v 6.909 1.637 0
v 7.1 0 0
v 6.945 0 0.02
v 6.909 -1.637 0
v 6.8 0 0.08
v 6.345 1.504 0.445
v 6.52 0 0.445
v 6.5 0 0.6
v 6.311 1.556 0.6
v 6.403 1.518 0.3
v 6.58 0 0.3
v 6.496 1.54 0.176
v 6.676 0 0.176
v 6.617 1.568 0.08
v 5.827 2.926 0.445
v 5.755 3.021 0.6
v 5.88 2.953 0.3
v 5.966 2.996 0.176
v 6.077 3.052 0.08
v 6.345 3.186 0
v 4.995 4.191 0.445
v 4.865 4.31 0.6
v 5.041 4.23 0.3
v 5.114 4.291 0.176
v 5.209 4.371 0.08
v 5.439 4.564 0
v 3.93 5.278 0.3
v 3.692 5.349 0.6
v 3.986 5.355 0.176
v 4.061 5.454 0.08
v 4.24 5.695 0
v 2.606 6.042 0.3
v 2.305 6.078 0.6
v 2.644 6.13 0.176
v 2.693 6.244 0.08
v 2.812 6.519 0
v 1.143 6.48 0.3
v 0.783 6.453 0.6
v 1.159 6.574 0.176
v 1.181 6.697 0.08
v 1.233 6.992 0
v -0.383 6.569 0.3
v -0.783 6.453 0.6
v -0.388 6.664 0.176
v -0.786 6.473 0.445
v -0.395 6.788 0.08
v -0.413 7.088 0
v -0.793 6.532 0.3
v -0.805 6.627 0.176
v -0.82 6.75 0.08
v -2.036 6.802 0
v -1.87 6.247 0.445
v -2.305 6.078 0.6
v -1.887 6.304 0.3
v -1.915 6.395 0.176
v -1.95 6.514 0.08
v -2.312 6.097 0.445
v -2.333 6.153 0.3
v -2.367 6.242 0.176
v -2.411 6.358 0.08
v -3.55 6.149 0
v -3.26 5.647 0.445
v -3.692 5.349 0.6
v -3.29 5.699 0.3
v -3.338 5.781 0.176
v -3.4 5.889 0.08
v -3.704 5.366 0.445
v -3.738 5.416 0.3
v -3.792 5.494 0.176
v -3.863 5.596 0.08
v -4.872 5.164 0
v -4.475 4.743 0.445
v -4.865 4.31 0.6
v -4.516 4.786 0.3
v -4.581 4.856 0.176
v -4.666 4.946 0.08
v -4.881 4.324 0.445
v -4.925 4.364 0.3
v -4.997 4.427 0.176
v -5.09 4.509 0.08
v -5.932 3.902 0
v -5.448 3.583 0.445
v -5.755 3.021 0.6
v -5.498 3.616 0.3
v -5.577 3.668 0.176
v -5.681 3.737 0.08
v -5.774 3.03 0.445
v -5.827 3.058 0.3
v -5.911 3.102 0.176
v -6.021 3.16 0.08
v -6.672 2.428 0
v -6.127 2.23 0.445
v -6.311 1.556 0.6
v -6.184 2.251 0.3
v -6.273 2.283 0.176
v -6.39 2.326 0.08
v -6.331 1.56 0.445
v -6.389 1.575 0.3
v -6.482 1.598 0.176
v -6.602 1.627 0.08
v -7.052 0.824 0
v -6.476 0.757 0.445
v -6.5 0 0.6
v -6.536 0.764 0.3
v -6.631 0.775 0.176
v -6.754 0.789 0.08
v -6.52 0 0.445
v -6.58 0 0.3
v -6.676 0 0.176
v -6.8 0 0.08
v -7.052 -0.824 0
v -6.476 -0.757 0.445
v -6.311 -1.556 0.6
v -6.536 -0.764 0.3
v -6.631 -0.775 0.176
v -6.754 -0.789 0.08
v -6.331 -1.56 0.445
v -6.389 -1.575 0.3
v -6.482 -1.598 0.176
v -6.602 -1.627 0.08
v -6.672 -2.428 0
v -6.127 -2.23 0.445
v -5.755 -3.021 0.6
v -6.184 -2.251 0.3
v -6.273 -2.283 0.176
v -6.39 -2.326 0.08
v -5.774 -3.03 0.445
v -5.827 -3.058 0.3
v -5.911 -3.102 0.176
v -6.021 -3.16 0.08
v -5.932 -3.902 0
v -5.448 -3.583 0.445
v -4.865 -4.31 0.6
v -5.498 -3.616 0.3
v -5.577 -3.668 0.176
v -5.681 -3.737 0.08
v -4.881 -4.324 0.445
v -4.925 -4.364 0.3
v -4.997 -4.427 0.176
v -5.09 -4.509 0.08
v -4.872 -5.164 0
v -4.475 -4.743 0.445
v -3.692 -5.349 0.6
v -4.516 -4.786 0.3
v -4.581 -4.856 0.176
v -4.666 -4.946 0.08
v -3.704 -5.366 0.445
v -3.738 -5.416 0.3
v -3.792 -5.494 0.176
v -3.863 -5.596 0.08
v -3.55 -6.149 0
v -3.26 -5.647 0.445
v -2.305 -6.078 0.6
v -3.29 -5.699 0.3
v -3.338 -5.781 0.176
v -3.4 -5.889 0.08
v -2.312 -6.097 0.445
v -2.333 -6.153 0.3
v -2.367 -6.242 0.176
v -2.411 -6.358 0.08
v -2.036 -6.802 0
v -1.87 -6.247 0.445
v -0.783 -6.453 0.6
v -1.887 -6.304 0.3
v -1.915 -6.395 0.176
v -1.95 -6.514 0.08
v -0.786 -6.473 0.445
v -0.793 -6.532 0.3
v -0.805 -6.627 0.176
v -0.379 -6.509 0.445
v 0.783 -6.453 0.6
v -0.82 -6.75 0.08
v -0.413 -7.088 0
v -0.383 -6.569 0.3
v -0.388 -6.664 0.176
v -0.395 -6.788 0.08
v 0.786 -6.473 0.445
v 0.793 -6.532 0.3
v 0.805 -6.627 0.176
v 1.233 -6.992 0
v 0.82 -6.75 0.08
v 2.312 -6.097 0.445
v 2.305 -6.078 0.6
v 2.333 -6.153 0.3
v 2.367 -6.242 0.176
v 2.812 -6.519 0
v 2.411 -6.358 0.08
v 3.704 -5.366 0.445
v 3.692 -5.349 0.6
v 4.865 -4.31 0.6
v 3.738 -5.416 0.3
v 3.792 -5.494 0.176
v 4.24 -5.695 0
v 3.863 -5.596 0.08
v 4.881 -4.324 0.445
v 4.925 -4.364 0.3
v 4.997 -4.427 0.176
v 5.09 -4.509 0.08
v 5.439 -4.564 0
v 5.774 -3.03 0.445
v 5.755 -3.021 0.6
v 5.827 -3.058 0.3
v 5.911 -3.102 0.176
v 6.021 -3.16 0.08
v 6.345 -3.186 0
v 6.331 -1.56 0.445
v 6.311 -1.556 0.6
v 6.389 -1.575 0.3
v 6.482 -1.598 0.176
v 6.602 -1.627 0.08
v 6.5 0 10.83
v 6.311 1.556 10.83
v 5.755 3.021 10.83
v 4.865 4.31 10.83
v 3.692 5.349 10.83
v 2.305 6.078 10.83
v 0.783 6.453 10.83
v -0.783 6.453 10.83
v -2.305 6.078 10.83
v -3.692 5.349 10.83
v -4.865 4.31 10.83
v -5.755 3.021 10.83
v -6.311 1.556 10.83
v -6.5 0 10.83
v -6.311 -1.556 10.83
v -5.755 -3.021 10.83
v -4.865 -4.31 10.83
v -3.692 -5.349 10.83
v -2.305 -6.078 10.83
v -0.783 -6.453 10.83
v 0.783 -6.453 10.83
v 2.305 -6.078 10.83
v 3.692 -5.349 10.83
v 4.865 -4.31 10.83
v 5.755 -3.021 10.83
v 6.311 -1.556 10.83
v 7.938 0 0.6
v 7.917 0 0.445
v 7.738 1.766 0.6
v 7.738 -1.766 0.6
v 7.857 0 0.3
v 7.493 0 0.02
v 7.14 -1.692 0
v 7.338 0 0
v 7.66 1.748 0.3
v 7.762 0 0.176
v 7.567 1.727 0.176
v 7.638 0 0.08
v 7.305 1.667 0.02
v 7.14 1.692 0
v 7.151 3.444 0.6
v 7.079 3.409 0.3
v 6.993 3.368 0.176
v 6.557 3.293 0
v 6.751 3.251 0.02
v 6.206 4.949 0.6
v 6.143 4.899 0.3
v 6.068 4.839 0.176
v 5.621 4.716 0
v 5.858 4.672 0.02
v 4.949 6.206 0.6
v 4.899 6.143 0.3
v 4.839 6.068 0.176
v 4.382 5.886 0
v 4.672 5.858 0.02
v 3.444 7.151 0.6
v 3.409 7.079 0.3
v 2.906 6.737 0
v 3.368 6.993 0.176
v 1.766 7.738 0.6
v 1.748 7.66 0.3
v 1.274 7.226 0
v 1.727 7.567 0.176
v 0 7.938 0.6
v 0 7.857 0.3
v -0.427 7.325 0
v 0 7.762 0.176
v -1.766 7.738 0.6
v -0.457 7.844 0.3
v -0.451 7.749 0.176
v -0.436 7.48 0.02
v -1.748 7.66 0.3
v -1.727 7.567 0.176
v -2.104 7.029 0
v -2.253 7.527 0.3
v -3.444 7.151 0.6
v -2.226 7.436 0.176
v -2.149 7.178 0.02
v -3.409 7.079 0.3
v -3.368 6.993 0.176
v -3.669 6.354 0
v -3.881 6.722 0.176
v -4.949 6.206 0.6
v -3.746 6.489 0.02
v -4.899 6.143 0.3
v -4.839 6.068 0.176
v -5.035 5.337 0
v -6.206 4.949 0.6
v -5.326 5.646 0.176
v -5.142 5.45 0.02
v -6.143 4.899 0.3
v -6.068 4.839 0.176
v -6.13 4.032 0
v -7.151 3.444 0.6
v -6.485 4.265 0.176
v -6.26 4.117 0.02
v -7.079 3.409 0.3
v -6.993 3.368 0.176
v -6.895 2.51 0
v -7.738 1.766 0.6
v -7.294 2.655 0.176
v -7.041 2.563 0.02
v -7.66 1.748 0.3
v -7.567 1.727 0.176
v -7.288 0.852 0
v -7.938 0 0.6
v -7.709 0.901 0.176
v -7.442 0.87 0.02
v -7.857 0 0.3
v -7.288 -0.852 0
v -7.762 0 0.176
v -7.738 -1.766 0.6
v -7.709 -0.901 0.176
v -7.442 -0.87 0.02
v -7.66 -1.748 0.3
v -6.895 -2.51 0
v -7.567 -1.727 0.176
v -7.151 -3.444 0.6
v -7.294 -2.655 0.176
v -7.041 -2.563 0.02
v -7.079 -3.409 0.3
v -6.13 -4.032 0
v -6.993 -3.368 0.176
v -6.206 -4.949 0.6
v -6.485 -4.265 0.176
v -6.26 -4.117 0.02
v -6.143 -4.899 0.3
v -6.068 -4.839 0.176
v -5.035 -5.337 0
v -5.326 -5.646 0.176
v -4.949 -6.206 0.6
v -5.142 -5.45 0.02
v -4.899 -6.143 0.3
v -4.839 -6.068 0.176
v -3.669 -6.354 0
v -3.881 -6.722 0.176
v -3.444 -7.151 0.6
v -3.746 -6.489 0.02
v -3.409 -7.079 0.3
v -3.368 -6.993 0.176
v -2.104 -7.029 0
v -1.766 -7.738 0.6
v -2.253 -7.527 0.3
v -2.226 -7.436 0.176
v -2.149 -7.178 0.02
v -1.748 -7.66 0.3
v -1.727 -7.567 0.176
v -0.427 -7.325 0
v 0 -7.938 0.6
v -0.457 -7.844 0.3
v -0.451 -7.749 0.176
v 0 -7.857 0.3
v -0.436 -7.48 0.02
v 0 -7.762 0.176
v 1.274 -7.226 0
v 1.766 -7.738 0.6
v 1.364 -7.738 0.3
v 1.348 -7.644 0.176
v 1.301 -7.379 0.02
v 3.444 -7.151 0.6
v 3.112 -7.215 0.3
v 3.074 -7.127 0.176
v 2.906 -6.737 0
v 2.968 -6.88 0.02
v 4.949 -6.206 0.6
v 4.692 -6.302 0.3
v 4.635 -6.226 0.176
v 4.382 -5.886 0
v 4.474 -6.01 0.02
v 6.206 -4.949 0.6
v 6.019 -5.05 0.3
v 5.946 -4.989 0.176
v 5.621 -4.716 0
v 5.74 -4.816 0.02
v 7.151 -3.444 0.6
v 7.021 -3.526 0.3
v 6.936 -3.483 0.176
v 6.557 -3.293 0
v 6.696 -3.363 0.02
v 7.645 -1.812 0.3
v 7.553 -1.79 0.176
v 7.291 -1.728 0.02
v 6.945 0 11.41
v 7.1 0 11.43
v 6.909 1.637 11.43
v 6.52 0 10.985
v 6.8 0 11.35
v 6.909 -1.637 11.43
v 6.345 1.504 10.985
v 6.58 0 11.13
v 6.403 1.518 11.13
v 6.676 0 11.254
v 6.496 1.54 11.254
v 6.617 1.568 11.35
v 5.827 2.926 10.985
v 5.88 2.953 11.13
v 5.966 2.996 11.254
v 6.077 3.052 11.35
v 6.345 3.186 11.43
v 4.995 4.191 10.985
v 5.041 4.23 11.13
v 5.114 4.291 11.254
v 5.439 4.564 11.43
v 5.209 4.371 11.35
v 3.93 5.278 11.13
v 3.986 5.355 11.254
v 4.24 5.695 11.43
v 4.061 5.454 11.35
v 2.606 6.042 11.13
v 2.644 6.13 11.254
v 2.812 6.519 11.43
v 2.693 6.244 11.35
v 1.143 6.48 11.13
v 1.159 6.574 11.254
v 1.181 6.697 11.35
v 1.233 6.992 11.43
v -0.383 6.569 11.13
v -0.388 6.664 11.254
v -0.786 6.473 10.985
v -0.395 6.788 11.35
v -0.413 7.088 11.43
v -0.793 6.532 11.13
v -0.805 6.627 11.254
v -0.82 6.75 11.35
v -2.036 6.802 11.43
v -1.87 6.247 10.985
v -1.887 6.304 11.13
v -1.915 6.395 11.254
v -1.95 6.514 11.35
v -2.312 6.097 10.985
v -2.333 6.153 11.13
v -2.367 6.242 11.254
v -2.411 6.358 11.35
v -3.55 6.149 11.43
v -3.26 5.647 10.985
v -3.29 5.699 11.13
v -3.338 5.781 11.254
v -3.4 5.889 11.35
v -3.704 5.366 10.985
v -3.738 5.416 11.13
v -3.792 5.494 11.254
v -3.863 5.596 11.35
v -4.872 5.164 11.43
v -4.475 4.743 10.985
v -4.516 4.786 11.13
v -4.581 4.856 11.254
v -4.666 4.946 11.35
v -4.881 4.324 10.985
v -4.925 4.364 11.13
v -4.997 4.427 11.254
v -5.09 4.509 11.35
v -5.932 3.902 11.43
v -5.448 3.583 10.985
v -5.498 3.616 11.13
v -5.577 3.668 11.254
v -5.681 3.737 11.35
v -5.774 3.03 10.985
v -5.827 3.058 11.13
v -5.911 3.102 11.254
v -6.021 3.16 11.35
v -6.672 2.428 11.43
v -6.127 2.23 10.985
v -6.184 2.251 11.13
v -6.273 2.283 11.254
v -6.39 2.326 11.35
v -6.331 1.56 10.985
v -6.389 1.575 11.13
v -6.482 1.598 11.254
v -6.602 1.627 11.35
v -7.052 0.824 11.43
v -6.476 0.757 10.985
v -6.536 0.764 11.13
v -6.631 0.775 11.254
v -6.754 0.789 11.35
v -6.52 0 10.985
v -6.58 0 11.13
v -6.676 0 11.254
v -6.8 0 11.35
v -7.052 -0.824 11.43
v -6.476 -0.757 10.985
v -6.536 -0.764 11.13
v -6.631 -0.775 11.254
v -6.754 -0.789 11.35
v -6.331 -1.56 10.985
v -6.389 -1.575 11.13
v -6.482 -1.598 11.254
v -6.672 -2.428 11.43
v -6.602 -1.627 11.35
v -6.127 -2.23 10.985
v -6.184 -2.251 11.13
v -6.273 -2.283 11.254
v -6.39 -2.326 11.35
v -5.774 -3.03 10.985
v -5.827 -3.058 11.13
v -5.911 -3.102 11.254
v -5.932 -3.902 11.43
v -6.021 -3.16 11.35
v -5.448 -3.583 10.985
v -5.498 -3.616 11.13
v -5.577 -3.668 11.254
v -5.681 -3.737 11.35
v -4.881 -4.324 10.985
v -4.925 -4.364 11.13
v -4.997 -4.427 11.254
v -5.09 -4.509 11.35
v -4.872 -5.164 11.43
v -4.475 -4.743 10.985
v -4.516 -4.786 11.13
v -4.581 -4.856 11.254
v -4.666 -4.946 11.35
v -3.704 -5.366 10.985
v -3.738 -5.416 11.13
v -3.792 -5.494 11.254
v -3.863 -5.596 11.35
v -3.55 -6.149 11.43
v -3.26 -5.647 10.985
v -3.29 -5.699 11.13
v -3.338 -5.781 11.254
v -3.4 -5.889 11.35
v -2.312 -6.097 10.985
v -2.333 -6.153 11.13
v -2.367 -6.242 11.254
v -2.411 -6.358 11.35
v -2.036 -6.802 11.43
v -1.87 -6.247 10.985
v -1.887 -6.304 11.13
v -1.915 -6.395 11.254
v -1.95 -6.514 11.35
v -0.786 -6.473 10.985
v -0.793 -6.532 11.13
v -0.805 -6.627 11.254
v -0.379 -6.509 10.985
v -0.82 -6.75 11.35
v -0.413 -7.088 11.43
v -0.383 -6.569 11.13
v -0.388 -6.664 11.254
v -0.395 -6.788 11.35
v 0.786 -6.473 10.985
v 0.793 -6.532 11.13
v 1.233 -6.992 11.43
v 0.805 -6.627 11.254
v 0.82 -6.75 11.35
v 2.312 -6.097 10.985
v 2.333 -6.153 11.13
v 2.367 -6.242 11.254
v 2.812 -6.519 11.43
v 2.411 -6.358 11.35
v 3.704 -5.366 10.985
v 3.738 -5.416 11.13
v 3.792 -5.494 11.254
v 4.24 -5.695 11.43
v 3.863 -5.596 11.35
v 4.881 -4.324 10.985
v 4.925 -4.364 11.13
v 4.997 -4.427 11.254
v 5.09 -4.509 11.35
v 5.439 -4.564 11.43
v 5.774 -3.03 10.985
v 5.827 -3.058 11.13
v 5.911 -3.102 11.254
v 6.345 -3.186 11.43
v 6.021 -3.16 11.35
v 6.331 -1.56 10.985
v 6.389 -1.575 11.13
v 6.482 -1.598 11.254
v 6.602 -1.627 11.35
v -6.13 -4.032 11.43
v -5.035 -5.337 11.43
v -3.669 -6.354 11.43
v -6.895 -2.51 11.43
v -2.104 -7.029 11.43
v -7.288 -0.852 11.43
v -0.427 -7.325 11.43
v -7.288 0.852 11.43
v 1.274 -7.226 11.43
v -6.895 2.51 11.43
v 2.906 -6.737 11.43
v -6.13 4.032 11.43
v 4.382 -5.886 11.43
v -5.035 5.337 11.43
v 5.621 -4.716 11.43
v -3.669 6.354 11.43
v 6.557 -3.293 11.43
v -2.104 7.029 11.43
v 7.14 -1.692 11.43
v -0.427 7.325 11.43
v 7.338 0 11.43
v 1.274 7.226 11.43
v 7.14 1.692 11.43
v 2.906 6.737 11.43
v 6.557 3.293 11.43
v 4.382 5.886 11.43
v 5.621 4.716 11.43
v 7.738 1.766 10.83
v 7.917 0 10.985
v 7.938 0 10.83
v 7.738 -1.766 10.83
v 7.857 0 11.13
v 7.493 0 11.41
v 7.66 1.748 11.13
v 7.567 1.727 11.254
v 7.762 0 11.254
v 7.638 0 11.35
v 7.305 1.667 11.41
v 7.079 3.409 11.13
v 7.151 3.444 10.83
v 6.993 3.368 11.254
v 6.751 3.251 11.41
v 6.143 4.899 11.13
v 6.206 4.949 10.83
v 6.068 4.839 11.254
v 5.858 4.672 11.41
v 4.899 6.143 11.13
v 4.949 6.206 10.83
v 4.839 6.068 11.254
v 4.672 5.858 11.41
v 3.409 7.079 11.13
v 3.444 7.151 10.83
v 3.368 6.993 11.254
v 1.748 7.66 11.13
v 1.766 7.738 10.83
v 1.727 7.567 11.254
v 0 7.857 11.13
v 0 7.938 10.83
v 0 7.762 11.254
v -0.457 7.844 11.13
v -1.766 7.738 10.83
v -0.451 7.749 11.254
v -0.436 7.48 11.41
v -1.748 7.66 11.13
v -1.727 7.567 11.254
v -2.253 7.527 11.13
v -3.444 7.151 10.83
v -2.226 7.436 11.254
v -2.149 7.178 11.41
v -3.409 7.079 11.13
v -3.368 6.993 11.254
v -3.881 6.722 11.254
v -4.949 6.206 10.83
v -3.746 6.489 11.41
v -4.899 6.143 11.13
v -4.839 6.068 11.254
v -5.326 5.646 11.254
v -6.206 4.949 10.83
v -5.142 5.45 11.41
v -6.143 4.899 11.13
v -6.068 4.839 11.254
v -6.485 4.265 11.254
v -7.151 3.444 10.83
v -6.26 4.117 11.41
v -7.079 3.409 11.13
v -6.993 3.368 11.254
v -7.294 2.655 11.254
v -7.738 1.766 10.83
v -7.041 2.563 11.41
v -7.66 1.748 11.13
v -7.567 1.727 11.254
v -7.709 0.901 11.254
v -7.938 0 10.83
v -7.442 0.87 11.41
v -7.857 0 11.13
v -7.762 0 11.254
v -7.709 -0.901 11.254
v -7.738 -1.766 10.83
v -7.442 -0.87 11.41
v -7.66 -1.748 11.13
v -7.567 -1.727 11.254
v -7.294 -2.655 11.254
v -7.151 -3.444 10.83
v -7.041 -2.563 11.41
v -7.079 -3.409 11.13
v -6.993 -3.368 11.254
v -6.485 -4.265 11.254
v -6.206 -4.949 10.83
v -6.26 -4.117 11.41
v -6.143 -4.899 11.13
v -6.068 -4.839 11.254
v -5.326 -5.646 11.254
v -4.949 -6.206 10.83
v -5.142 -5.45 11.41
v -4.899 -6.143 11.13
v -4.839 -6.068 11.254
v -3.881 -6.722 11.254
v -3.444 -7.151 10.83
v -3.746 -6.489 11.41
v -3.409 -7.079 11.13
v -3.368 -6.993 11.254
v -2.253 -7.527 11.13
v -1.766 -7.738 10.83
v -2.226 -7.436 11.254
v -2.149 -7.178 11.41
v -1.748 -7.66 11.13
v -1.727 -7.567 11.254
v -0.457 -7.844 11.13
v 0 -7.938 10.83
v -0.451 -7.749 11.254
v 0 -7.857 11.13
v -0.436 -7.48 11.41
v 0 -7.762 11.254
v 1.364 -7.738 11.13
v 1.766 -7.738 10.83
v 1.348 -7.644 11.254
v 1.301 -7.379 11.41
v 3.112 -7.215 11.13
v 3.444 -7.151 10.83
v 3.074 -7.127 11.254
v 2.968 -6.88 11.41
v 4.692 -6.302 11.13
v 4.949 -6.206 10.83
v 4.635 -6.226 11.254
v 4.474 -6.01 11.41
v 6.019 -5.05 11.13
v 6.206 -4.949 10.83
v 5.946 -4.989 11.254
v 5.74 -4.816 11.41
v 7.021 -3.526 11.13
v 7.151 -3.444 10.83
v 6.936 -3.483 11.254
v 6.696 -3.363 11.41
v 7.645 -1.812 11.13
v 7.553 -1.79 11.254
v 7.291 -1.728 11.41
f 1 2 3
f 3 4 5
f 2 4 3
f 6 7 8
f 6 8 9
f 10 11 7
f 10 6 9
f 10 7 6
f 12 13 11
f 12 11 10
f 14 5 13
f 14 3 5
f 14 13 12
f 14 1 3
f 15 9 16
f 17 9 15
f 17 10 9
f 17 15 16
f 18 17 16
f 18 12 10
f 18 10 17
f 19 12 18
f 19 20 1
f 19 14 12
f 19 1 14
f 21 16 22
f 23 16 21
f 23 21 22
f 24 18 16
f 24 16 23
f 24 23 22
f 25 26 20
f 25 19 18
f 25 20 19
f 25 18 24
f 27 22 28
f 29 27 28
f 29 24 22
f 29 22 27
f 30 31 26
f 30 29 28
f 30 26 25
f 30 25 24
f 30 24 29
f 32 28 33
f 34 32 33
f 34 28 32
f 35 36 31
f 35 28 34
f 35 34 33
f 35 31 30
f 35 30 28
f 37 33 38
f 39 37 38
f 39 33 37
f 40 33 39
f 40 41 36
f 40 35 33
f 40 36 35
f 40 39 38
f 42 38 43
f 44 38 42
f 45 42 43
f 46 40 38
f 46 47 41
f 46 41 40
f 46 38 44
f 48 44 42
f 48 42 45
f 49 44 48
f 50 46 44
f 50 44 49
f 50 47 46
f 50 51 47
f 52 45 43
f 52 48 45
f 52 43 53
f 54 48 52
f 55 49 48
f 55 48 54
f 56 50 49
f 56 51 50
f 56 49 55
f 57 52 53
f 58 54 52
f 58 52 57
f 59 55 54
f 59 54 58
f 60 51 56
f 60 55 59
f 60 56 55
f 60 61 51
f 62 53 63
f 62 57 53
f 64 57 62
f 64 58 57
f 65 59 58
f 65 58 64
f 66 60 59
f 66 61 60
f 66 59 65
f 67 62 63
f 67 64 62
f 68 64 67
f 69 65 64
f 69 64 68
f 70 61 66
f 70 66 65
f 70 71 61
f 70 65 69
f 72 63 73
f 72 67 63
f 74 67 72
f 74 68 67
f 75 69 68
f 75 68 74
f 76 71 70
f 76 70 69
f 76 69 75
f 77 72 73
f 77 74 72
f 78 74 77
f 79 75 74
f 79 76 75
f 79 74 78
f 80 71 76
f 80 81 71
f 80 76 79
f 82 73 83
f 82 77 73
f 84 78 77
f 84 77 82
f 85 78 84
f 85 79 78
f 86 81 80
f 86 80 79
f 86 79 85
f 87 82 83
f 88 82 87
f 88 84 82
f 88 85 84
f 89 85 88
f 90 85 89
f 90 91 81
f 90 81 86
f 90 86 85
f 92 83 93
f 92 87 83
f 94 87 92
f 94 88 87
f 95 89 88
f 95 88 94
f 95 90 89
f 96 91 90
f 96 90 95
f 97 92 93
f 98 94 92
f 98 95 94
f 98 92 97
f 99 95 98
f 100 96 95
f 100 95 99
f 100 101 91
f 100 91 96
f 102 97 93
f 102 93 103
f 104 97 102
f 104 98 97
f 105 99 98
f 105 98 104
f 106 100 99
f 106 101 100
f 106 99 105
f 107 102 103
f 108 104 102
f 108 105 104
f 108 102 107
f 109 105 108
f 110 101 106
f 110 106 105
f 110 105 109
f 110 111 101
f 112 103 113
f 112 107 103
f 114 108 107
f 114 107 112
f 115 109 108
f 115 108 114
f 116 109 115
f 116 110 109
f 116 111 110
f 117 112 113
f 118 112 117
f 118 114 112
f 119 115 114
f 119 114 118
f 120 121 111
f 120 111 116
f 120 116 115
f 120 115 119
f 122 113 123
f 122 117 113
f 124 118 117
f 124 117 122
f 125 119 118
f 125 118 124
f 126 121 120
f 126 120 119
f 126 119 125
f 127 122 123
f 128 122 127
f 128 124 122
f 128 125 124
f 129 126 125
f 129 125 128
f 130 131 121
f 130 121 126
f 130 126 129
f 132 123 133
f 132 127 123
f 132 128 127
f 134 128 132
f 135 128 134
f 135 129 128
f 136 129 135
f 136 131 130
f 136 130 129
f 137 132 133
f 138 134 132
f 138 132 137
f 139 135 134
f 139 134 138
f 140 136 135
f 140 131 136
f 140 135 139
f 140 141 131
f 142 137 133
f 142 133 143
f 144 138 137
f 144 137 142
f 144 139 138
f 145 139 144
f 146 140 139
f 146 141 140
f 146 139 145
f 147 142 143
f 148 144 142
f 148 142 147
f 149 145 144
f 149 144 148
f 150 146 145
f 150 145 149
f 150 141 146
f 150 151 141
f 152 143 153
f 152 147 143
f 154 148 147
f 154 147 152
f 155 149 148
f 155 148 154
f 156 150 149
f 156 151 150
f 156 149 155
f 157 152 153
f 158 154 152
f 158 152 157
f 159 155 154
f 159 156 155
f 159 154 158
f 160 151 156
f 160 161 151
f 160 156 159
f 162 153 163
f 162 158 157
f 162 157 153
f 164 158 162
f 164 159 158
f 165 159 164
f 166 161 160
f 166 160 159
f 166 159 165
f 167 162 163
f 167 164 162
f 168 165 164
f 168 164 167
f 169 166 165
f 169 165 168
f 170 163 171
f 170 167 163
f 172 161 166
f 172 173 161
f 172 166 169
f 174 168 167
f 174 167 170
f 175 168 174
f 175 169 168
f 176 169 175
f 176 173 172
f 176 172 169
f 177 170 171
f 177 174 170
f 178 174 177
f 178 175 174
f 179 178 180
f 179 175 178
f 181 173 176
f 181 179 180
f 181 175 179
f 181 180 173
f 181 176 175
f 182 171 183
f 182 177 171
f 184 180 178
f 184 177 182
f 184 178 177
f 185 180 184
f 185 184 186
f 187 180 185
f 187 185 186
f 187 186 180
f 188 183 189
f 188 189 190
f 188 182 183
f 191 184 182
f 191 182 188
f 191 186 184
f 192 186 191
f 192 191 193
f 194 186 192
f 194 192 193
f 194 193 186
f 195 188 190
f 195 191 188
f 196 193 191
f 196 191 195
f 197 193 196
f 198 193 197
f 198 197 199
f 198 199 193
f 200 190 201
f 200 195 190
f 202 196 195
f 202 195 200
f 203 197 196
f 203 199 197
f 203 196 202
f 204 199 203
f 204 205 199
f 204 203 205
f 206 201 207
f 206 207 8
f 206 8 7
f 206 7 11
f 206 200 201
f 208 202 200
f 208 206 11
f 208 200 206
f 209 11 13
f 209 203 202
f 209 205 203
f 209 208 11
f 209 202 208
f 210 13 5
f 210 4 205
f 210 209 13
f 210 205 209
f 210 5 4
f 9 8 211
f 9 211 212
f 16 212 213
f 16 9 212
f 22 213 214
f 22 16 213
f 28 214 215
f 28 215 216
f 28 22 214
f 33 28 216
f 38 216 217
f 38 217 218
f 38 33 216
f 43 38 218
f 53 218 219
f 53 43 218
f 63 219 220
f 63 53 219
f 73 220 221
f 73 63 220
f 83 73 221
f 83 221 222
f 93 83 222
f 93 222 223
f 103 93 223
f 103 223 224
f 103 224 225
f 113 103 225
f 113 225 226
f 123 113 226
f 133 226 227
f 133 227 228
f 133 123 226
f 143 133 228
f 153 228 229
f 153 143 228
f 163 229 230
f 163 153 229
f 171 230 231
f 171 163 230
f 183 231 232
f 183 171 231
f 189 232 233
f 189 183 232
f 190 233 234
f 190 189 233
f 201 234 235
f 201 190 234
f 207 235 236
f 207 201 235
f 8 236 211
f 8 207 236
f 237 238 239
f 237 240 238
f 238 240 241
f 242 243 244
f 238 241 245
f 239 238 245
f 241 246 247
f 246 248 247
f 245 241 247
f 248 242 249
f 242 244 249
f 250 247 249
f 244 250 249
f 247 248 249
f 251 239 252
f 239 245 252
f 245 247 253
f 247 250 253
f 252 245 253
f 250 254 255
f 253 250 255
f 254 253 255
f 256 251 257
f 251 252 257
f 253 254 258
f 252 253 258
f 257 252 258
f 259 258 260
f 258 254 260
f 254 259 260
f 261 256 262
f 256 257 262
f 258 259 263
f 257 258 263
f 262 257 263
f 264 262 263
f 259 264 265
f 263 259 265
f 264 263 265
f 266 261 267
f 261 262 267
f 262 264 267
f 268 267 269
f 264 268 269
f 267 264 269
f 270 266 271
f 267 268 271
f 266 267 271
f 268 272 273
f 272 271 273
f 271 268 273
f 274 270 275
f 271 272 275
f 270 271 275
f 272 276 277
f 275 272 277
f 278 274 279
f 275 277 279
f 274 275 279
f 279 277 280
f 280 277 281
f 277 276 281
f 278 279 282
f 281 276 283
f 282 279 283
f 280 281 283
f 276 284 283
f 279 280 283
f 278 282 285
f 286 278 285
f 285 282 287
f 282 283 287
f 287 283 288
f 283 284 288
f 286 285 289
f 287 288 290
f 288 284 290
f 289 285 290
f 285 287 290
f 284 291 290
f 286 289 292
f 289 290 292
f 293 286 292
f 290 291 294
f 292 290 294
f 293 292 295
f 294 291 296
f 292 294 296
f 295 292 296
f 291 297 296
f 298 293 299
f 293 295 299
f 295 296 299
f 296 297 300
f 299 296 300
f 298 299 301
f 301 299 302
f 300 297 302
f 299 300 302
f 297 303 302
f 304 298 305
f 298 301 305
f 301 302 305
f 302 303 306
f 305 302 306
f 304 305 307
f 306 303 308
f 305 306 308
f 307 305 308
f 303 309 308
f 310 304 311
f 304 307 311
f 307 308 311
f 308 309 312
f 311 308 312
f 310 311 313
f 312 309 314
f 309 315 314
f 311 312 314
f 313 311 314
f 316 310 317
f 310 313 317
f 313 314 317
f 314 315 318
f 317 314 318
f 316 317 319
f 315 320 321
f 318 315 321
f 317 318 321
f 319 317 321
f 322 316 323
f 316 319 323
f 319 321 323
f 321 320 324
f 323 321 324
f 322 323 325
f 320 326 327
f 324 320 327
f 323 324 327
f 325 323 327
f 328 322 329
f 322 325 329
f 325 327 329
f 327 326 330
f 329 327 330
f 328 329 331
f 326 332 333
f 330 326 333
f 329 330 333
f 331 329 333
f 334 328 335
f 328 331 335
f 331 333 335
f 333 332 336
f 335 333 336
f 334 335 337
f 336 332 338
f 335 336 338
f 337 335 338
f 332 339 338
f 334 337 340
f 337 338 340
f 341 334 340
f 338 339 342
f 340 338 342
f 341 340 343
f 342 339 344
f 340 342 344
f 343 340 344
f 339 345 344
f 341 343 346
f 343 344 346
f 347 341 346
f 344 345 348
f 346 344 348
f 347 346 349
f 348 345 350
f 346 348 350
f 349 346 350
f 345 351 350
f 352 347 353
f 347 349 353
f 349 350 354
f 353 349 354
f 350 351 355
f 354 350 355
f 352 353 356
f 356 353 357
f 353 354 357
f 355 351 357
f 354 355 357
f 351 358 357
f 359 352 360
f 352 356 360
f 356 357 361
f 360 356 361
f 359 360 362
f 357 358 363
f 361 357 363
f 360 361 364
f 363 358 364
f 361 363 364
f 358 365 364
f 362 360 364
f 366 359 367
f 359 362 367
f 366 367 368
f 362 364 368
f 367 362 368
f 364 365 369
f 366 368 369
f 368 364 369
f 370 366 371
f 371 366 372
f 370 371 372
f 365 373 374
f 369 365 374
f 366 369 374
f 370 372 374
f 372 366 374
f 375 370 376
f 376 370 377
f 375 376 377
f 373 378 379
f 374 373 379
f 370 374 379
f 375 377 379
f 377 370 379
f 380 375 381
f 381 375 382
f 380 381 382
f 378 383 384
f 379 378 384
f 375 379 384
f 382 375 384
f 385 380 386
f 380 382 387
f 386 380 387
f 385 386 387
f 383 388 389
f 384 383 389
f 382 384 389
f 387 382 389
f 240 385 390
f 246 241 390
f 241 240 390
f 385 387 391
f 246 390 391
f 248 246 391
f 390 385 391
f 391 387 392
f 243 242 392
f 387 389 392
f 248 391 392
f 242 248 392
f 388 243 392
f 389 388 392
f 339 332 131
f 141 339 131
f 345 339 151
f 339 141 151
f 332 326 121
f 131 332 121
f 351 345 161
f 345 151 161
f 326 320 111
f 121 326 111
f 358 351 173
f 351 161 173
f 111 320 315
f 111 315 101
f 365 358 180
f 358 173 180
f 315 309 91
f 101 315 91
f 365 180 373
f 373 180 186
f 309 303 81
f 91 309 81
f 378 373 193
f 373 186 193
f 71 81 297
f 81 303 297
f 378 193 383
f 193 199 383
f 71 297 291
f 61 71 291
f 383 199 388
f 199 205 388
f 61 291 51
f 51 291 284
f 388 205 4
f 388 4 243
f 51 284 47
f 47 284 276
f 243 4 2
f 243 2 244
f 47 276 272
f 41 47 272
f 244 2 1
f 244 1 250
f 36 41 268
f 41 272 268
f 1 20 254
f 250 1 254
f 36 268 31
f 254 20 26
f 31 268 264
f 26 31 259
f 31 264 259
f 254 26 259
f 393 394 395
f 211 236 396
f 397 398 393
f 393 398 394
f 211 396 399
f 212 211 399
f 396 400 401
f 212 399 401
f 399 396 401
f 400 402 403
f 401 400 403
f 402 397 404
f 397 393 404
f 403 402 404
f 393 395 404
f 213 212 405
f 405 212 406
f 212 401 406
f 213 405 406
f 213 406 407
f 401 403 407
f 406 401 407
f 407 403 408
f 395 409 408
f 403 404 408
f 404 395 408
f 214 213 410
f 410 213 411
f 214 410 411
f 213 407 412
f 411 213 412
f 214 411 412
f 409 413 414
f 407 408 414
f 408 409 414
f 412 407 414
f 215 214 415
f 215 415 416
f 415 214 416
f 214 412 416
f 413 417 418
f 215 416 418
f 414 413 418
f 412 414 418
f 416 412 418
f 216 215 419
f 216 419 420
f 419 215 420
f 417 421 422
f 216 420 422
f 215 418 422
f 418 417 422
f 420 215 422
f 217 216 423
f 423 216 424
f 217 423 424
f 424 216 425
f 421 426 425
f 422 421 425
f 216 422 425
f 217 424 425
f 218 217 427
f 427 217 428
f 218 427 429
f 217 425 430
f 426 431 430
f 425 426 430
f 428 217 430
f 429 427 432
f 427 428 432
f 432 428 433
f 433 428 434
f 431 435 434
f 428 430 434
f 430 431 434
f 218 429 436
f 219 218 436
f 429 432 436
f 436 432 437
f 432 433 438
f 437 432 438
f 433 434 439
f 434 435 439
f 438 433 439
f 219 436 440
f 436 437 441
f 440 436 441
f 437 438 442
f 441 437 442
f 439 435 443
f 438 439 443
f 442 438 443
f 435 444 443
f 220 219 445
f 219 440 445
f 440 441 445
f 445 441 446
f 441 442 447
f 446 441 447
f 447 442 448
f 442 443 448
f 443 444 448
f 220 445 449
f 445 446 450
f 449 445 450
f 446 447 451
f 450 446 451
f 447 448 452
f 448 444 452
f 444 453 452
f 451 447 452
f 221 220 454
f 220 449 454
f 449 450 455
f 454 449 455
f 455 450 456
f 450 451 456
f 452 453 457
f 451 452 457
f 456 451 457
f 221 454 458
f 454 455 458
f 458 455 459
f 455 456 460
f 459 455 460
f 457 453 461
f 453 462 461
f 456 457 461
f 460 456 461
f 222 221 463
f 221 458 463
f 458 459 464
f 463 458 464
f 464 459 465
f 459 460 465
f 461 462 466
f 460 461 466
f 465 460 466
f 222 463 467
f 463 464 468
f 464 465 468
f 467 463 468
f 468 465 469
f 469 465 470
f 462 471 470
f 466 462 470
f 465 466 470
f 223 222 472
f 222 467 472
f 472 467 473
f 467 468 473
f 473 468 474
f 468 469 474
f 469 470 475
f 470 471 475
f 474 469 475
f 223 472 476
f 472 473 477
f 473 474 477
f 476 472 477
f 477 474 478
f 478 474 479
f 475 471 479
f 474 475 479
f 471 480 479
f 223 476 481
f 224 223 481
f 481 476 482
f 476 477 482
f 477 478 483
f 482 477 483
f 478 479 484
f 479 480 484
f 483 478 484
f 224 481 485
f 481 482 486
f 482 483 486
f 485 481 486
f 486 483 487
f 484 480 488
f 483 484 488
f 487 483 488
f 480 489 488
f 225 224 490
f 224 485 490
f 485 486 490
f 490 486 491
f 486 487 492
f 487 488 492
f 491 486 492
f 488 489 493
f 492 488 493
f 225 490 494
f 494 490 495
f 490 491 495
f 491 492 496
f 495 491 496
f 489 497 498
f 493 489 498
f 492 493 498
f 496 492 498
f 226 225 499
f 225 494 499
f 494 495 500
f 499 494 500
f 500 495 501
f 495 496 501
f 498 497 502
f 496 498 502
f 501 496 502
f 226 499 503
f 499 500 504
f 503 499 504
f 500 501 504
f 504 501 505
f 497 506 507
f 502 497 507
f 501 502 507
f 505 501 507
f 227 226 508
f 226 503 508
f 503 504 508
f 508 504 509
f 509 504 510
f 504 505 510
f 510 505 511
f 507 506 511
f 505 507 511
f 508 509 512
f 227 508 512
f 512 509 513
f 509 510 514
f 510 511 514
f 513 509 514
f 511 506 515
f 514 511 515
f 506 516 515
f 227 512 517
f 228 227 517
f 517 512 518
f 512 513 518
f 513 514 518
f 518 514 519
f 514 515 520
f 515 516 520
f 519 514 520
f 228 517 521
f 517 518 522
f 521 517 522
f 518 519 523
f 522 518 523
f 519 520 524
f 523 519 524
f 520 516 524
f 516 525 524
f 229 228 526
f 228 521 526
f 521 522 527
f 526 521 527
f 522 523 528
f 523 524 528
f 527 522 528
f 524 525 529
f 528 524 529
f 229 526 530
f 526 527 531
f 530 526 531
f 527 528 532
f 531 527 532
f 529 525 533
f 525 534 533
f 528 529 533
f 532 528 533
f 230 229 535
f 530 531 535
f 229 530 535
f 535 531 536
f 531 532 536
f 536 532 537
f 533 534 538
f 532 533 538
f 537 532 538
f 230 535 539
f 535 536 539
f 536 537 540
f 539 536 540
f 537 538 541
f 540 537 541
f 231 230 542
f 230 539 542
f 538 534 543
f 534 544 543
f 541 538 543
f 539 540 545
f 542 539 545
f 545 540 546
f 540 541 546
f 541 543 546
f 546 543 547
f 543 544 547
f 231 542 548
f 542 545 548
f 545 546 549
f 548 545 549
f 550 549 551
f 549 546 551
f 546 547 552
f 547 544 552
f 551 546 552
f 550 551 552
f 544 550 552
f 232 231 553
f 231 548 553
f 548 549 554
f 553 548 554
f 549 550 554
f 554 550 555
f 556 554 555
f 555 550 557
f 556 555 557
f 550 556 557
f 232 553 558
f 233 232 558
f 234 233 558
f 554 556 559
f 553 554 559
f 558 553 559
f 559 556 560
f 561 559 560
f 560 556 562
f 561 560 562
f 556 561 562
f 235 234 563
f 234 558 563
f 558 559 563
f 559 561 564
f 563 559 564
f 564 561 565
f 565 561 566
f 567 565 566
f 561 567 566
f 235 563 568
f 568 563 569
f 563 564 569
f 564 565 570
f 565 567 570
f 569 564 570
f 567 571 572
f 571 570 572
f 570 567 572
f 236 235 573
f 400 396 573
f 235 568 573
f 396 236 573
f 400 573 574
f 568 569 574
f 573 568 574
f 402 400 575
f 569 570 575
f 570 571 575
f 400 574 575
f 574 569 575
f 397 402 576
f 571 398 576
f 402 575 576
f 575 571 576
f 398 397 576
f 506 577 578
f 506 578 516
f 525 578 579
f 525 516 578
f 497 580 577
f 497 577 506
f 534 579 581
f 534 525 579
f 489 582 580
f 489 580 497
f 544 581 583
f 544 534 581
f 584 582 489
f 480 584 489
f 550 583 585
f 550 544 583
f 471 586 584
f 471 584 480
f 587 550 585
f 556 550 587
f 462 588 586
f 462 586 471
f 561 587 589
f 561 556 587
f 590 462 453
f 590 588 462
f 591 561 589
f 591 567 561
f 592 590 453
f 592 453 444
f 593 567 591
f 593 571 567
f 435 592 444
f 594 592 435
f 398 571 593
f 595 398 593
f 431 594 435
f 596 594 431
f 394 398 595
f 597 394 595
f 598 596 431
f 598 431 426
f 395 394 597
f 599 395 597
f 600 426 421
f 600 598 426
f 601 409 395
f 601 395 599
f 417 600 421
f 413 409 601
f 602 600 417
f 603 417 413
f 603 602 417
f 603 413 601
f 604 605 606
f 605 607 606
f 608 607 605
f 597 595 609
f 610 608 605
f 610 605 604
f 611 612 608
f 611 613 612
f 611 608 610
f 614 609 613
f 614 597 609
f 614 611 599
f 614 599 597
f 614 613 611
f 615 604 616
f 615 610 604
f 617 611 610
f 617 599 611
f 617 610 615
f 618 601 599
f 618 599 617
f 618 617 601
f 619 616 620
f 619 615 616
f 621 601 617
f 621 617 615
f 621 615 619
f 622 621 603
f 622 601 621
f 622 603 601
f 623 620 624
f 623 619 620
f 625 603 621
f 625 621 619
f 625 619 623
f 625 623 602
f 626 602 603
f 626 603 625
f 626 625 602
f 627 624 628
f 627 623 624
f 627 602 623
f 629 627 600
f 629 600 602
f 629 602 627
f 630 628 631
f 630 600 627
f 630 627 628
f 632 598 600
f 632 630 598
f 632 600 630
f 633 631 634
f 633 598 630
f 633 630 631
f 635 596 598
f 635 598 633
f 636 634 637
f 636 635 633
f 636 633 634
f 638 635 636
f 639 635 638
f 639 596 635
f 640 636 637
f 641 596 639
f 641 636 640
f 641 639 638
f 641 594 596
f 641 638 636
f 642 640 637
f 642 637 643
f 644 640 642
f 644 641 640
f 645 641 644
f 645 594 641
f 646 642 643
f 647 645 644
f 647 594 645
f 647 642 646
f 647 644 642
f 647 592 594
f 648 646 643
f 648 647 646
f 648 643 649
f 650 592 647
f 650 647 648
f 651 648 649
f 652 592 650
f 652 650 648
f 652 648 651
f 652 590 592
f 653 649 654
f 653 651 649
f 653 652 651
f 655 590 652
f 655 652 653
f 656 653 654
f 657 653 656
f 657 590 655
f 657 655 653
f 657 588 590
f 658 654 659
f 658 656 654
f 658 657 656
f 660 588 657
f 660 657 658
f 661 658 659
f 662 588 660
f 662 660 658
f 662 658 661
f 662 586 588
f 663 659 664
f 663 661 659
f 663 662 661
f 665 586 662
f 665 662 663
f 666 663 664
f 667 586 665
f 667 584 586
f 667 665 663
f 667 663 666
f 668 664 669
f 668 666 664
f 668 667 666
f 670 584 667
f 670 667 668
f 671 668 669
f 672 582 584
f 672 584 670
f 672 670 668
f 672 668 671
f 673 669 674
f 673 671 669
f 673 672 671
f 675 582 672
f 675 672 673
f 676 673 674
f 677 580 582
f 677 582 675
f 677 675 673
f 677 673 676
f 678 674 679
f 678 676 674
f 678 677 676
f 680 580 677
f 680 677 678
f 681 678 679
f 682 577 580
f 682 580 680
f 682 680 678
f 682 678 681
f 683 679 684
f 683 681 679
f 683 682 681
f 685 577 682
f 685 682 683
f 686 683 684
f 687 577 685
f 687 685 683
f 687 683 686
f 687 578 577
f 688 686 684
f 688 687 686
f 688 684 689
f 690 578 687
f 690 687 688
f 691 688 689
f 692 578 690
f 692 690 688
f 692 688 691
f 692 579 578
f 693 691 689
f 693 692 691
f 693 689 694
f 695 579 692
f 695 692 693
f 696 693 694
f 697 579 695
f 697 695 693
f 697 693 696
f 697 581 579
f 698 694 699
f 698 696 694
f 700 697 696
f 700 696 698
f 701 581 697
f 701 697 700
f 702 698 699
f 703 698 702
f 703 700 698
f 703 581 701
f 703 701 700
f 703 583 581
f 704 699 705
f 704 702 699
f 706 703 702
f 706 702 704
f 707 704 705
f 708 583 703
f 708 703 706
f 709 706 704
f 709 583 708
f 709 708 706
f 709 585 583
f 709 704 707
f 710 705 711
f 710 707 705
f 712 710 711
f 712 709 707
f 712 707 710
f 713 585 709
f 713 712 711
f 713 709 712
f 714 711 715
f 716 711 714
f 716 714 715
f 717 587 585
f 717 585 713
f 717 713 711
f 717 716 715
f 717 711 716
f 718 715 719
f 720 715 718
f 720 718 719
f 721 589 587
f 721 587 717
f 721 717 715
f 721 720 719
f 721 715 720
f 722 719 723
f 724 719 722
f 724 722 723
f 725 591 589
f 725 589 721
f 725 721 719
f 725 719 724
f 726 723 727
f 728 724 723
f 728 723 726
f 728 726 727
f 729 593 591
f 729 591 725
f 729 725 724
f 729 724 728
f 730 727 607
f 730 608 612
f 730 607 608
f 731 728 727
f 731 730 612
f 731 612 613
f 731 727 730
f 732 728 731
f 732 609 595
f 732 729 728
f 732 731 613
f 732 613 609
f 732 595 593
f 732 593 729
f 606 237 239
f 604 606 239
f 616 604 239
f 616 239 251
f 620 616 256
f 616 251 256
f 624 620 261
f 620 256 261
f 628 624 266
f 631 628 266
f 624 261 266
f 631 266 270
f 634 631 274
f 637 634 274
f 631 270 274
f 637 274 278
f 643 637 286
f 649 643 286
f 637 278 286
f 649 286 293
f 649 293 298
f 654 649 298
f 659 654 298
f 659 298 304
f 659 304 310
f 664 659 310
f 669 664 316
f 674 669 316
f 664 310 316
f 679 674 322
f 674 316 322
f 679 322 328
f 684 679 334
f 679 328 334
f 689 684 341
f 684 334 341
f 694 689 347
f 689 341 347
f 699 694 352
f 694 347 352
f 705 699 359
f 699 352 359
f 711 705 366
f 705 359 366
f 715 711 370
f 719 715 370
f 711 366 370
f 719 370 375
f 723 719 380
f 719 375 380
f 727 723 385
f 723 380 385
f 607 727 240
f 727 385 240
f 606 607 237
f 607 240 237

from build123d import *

# Parameters (mm, degrees)
F0_R     = 7.9375
F0_R_2   = 6.5
F1_DEPTH = 11.43
F2_R     = 0.6
F3_R     = 0.6


with BuildPart() as f1:
    # F0 (on Top) → F1 (new body)
    with BuildSketch(Plane.XY):
        Circle(F0_R)
        Circle(F0_R_2, mode=Mode.SUBTRACT)
    extrude(amount=F1_DEPTH)

    # F2
    f2_edges = [f1.edges().sort_by_distance(p)[0] for p in [
        (-6.5, 0, 0),
        (-7.9375, 0, 11.43),
        (-6.5, 0, 11.43),
    ]]
    fillet(f2_edges, radius=F2_R)

    # F3
    f3_edges = [f1.edges().sort_by_distance(p)[0] for p in [
        (-7.9375, 0, 0),
    ]]
    fillet(f3_edges, radius=F3_R)


solid = f1.part
